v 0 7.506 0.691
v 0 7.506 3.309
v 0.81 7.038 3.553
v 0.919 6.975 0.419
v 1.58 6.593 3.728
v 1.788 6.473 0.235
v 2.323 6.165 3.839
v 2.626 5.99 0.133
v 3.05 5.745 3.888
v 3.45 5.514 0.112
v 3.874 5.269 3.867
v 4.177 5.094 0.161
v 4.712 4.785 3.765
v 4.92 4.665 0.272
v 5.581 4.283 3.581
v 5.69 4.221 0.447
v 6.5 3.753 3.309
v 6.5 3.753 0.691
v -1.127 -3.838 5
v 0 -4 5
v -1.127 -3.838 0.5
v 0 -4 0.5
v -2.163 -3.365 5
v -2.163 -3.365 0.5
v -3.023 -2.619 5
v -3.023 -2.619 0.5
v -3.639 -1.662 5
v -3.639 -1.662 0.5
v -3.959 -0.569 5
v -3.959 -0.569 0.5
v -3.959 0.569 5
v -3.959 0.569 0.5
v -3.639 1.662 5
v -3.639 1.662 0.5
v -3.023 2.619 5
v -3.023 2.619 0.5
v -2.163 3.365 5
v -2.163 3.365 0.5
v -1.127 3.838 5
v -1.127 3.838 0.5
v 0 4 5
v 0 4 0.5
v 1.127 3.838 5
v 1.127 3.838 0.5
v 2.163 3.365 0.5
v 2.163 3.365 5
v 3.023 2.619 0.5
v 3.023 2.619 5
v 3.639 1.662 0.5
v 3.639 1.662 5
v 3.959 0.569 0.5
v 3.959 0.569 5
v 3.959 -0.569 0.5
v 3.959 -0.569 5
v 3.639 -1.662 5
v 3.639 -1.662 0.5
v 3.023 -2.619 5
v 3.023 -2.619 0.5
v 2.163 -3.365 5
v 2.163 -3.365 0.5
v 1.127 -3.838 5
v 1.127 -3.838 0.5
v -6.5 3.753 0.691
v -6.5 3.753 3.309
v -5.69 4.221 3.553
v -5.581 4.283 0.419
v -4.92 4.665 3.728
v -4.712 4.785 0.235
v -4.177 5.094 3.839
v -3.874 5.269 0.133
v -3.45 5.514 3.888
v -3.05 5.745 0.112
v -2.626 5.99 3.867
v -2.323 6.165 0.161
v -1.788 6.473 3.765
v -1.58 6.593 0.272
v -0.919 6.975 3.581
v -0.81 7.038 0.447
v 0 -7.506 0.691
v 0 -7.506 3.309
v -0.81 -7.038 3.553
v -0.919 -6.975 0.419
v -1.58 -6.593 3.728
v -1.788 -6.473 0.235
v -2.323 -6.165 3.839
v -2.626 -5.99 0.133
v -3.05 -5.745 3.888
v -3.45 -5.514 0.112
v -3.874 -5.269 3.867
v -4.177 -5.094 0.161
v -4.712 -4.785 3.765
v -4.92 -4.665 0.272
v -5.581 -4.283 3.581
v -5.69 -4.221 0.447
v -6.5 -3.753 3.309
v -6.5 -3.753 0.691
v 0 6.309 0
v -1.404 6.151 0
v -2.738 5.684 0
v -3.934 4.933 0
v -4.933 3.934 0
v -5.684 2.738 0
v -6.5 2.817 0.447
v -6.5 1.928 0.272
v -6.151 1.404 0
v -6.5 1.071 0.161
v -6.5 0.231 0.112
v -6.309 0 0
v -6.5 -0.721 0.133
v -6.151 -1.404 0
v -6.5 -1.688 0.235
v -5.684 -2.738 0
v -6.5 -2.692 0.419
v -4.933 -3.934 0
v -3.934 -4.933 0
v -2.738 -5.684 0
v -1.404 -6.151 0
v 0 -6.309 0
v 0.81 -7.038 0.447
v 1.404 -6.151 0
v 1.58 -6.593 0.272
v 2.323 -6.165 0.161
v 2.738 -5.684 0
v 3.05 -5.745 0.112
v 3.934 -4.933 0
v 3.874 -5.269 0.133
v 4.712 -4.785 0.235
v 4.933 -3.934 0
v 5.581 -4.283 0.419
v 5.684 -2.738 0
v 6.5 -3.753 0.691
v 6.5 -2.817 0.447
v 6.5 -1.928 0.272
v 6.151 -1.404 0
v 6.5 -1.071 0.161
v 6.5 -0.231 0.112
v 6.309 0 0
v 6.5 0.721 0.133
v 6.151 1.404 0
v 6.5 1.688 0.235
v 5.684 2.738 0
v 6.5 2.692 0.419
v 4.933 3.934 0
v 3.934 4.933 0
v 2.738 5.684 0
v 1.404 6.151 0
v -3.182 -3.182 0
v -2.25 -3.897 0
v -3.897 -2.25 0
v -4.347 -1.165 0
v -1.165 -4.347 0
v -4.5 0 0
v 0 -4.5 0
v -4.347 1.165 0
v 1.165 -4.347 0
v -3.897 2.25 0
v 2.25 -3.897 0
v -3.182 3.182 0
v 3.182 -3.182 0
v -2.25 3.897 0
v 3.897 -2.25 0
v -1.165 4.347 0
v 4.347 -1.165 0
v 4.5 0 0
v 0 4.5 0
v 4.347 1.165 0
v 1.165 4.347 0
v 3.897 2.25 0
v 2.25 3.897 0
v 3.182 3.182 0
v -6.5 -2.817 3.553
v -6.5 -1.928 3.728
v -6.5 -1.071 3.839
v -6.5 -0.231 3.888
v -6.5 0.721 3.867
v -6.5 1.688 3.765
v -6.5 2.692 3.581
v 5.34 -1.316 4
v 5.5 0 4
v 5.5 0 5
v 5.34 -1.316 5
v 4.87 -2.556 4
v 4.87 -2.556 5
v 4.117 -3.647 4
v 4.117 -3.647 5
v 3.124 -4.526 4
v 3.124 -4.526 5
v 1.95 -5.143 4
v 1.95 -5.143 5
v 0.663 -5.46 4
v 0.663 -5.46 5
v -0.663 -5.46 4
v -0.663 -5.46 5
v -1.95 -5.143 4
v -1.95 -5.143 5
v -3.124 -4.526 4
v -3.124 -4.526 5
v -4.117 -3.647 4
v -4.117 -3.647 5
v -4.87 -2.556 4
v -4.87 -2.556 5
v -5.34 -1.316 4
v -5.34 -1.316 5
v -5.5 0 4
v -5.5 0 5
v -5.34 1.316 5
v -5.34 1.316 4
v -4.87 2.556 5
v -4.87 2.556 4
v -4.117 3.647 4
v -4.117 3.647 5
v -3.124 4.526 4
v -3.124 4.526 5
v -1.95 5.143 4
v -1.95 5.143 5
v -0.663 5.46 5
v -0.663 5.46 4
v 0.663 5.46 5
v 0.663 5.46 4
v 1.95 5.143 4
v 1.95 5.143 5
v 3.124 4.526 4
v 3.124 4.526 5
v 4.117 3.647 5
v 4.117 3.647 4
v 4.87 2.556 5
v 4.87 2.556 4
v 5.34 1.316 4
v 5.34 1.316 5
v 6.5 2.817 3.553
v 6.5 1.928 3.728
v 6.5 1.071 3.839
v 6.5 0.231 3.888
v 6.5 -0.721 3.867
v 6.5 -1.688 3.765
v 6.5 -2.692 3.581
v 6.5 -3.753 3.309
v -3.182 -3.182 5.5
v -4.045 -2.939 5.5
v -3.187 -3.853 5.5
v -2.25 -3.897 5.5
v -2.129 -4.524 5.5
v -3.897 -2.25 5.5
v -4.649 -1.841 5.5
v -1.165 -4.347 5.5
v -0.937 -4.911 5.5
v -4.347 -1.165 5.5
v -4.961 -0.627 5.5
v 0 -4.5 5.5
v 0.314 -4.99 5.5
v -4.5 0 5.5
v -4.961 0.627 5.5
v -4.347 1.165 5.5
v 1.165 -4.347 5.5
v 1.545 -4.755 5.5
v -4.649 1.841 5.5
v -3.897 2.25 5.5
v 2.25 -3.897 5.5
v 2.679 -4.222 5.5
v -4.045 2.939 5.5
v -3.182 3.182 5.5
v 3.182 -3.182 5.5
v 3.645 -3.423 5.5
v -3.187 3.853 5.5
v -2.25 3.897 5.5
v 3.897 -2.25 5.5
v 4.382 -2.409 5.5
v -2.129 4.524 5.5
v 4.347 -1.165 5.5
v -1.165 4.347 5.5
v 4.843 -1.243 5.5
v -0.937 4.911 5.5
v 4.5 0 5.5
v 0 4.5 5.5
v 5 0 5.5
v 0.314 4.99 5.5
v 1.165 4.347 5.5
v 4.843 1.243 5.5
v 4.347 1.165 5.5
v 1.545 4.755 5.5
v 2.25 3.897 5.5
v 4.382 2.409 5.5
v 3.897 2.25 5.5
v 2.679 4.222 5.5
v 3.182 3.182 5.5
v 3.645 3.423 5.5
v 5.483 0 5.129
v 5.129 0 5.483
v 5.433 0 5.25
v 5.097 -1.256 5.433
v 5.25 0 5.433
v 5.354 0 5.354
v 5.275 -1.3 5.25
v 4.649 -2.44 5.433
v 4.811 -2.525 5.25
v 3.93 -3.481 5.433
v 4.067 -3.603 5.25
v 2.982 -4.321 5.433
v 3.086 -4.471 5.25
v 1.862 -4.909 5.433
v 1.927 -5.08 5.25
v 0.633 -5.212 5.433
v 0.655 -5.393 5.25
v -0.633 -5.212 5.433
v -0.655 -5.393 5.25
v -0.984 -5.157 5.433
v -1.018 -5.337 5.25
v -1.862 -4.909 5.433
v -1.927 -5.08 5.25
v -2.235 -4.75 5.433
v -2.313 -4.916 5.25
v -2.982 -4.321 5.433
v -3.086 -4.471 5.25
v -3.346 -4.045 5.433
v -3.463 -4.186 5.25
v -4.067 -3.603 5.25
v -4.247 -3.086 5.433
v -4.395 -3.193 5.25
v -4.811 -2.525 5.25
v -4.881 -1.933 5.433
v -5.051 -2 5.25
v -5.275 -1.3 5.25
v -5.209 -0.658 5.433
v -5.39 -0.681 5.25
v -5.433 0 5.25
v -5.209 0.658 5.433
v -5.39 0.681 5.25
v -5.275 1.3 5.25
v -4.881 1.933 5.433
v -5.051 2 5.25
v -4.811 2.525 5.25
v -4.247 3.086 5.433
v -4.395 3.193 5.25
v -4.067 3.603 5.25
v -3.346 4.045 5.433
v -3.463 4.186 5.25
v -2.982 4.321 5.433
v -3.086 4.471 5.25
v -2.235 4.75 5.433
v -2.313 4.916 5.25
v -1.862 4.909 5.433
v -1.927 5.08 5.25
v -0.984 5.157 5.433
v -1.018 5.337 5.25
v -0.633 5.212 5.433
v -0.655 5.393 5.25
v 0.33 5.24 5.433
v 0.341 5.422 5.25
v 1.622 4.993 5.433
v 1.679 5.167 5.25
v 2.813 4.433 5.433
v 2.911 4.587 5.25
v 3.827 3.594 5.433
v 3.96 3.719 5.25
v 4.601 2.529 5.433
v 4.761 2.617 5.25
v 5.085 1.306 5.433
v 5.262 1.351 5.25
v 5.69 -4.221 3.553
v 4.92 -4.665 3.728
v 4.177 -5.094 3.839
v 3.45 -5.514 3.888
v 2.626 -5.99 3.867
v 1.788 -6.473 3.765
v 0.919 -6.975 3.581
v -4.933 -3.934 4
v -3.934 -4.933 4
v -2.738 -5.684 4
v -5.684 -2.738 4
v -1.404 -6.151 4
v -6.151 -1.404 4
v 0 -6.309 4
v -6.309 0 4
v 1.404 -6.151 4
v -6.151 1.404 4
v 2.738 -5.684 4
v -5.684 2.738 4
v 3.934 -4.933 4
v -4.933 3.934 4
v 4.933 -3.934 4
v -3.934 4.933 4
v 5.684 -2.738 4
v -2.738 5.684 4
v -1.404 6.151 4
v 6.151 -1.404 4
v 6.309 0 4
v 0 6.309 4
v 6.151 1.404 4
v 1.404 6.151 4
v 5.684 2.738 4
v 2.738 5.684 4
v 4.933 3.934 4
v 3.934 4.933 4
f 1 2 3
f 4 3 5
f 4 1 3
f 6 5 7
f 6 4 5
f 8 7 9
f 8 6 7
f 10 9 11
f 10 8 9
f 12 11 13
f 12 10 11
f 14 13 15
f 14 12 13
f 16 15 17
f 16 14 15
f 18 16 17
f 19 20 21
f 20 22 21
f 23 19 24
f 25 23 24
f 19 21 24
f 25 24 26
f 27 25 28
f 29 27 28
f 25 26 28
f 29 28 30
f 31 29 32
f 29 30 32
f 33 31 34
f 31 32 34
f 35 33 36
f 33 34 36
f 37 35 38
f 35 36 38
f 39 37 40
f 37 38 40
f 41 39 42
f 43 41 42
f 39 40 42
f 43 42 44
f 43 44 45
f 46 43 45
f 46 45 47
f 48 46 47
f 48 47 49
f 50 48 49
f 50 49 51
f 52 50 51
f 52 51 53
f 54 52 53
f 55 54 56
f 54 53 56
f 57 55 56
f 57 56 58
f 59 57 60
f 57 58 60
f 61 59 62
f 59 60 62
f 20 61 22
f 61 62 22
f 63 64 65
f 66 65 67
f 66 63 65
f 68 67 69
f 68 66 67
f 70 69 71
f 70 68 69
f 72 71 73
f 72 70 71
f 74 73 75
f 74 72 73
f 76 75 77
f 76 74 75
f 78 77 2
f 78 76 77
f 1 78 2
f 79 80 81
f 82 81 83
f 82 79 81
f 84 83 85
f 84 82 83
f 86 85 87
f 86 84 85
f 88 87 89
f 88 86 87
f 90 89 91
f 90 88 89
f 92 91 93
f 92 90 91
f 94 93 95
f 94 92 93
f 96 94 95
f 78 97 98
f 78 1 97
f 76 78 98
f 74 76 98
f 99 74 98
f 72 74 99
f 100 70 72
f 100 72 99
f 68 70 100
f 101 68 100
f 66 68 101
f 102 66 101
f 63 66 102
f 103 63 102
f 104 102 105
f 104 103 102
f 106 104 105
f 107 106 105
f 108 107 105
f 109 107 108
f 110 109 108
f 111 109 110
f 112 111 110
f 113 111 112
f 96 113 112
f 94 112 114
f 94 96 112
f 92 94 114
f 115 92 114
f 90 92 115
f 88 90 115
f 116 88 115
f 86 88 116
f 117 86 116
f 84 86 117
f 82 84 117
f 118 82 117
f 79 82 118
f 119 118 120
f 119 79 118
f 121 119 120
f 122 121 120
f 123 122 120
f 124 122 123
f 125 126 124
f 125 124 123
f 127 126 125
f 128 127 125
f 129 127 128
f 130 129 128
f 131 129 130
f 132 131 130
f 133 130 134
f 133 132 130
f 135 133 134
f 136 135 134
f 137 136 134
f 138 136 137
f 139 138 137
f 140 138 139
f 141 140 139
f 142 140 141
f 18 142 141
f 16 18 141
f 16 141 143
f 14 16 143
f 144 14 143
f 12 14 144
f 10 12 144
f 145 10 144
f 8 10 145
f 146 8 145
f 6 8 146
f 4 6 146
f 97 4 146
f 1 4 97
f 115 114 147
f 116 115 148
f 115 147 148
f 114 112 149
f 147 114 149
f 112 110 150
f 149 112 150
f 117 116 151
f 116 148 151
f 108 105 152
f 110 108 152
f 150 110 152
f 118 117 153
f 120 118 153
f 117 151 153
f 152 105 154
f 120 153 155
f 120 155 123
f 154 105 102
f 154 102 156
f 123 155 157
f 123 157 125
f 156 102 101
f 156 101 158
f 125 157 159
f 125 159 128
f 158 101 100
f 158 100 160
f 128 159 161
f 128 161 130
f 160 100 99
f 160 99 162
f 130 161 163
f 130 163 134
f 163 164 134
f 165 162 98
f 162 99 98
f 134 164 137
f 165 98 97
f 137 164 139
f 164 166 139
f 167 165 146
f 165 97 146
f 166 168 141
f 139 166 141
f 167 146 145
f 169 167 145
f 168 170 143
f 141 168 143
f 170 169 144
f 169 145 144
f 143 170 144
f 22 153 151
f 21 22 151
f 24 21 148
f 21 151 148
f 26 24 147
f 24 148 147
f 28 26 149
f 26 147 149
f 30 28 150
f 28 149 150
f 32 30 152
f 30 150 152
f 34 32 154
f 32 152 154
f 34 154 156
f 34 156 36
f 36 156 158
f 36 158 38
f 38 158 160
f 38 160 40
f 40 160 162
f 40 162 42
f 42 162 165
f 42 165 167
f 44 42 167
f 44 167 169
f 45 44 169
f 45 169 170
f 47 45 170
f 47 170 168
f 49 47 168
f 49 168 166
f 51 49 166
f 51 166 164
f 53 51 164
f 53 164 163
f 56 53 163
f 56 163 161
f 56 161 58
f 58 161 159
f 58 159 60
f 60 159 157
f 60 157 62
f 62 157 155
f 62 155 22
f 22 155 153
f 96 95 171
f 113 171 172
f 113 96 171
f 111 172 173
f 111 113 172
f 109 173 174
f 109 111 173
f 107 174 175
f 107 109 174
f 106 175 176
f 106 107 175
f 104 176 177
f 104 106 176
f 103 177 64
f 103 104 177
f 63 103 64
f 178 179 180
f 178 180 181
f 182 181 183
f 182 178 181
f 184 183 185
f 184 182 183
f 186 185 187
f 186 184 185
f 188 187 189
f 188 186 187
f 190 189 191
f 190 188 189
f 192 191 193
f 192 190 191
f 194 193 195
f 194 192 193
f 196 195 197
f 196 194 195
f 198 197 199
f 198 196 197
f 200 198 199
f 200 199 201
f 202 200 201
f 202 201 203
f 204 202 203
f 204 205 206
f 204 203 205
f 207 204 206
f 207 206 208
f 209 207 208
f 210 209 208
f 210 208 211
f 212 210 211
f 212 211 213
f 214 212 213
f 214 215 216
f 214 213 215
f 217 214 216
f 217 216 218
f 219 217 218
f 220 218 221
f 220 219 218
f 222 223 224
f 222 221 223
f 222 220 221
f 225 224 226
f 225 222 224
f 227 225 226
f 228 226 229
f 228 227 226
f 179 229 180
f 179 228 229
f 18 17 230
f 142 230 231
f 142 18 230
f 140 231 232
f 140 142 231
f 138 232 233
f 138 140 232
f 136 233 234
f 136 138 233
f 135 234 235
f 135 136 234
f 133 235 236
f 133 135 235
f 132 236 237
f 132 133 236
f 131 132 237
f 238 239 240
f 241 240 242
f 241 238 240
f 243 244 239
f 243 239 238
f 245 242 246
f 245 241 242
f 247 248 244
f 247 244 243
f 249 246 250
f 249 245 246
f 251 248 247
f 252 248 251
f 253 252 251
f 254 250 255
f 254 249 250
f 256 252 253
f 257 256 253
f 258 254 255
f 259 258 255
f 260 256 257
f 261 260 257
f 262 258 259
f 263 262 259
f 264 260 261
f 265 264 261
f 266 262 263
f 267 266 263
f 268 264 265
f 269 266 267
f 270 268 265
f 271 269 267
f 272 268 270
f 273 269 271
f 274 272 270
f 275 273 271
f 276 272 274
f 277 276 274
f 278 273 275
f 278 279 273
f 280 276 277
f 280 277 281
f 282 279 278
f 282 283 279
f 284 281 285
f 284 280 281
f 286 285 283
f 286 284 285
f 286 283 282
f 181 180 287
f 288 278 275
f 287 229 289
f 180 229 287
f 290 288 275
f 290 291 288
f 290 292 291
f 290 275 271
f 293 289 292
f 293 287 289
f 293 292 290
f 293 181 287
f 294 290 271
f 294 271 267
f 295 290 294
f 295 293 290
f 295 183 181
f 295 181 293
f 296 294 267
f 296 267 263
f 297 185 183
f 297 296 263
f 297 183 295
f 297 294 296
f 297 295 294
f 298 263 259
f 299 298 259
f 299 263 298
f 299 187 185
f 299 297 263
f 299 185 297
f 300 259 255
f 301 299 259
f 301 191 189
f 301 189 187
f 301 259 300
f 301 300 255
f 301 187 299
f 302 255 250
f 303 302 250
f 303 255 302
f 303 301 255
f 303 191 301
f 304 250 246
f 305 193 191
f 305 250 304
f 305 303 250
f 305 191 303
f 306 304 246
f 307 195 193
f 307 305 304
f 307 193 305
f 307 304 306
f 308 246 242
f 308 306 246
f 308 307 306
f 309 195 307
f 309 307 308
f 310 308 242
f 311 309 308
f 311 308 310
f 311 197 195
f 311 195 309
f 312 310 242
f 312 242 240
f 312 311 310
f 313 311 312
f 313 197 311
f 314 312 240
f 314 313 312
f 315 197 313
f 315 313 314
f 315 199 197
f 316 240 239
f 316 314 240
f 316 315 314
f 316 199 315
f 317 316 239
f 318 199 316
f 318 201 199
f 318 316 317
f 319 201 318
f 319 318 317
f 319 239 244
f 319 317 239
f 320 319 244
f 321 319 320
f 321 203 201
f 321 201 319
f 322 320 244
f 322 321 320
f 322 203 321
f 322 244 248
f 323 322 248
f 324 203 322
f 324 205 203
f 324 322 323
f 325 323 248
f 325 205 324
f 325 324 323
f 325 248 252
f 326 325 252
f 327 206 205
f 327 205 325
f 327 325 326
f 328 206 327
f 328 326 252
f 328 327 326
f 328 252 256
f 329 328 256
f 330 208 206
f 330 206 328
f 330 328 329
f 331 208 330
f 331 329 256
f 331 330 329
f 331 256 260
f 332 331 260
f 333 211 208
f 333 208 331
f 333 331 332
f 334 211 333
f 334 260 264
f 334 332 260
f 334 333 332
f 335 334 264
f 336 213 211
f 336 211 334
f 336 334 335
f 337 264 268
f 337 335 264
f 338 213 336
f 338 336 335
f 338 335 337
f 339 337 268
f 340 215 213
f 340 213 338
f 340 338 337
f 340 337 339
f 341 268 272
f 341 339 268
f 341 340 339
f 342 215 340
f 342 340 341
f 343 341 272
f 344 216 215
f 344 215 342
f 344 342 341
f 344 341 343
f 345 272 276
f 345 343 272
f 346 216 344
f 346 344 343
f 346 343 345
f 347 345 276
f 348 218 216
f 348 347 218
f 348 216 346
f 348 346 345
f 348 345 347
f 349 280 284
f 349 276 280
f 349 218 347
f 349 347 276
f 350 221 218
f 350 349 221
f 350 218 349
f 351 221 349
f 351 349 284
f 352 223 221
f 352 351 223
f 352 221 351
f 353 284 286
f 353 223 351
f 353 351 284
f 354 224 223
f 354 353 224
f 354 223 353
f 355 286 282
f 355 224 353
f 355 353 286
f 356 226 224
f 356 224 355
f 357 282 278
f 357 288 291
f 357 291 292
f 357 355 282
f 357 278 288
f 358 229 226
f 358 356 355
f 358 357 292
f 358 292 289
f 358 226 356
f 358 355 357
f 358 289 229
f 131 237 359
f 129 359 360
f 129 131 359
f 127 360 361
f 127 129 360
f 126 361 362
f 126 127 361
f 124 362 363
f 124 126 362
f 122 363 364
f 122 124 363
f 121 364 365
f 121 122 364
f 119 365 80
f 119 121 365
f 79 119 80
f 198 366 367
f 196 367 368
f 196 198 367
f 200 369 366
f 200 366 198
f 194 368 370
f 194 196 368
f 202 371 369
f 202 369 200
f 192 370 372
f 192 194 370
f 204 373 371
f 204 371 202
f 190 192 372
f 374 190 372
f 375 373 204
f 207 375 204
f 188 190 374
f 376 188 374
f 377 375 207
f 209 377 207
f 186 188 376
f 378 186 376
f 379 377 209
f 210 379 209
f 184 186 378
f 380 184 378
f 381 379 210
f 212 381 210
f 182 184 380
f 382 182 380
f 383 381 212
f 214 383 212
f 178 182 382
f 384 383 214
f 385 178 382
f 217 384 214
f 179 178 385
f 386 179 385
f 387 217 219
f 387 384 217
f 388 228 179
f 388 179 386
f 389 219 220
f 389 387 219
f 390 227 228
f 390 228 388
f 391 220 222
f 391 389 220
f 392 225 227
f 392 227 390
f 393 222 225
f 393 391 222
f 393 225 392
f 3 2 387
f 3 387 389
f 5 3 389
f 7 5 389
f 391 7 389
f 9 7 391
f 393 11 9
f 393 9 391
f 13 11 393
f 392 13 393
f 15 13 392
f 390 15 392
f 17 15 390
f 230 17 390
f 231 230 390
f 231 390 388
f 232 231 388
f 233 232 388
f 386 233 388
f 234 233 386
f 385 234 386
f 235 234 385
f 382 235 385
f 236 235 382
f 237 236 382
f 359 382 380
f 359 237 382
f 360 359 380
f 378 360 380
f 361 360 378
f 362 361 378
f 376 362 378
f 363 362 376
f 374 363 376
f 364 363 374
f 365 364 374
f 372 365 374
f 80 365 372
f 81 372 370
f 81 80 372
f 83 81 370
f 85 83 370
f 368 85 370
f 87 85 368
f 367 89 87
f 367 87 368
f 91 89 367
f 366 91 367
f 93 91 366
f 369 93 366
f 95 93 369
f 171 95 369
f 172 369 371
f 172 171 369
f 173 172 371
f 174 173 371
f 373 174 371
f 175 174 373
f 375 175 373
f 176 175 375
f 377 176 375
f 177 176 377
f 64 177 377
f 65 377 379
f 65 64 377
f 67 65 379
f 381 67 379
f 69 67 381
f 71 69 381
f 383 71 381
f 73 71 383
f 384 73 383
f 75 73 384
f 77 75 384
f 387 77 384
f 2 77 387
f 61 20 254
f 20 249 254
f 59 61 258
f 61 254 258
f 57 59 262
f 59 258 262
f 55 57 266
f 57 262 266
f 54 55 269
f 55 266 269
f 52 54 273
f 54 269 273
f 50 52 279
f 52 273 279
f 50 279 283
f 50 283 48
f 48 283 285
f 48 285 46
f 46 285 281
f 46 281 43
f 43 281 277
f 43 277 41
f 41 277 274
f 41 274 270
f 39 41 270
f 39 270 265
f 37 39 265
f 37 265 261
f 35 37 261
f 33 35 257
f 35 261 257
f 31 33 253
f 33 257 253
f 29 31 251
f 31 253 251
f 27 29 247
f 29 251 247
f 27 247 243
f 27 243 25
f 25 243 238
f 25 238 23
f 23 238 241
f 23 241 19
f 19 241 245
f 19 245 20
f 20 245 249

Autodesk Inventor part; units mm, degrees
ref_plane "YZ Plane" through (0, 0, 0) normal (1, 0, 0) x (0, 1, 0)
ref_plane "XZ Plane" through (0, 0, 0) normal (0, 1, 0) x (-1, 0, 0)
sketch "Schizzo1" plane through (0, 0, 0) normal (0, 0, 1) x (1, 0, 0)
  line L0 (0, 7.5056) -> (6.5, 3.7528)
  line L1 (6.5, 3.7528) -> (6.5, -3.7528)
  line L2 (6.5, -3.7528) -> (0, -7.5056)
  line L3 (0, -7.5056) -> (-6.5, -3.7528)
  line L4 (-6.5, -3.7528) -> (-6.5, 3.7528)
  line L5 (-6.5, 3.7528) -> (0, 7.5056)
  point P0 (0, 0)
  point P1 (0, 0)
  dimension "d0" = 13
extrude "Estrusione1" add sketch "Schizzo1" along normal blind 4
sketch "Schizzo2" plane through (0, 0, 4) normal (0, 0, 1) x (1, 0, 0)
  circle A0 centre (0, 0) radius 5.5
  dimension "d5" = 11
extrude "Estrusione2" add sketch "Schizzo2" along normal blind 1.5
sketch "Schizzo3" plane through (0, 0, 0) normal (1, 0, 0) x (0, 1, 0)
  line L0 (7.5056, 4) -> (3.7528, 4) projected
  line L1 (3.7528, 0) -> (3.7528, 4) projected
  line L2 (7.5056, 0) -> (3.7528, 0) projected
  line L3 (7.5056, 0) -> (7.5056, 4) projected
  line L4 (6.3093, 0) -> (7.5056, 0.6907)
  line L5 (0, -1) -> (0, 6) projected
  line L6 (6.3093, 4) -> (7.5056, 4)
  line L7 (6.3093, 4) -> (7.5056, 3.3093)
  point P0 (0, 0)
  dimension "d6" = 30
  dimension "d23" = 30
ref_plane "Piano di lavoro1" through (0, 0, 2) normal (0, 0, -1) x (-1, 0, 0)
sketch "Schizzo4" plane through (0, 0, 5.5) normal (0, 0, 1) x (1, 0, 0)
  circle A0 centre (0, 0) radius 5.5 projected
hole "Foro1" at (0, 0, 5.5) direction (0, 0, -1) diameter 8 end through all
thread "Filettatura1" size "M9x1.25" class "6H" standard "ANSI Metric M Profile" full length
chamfer "Smusso1" distance 0.5 angle 45 2 edges at (0, 4, 5.5) (0, 4, 0)
revolve "Rivoluzione2" cut sketch "Schizzo3" angle 360 about axis through (0, 0, -10) along (0, 0, 1) contours L3 L7 L0 | L3 L2 L4
fillet "Raccordo1" radius 0.5 1 edges at (-5.5, 0, 5.5)
properties part number "Dado 13"
